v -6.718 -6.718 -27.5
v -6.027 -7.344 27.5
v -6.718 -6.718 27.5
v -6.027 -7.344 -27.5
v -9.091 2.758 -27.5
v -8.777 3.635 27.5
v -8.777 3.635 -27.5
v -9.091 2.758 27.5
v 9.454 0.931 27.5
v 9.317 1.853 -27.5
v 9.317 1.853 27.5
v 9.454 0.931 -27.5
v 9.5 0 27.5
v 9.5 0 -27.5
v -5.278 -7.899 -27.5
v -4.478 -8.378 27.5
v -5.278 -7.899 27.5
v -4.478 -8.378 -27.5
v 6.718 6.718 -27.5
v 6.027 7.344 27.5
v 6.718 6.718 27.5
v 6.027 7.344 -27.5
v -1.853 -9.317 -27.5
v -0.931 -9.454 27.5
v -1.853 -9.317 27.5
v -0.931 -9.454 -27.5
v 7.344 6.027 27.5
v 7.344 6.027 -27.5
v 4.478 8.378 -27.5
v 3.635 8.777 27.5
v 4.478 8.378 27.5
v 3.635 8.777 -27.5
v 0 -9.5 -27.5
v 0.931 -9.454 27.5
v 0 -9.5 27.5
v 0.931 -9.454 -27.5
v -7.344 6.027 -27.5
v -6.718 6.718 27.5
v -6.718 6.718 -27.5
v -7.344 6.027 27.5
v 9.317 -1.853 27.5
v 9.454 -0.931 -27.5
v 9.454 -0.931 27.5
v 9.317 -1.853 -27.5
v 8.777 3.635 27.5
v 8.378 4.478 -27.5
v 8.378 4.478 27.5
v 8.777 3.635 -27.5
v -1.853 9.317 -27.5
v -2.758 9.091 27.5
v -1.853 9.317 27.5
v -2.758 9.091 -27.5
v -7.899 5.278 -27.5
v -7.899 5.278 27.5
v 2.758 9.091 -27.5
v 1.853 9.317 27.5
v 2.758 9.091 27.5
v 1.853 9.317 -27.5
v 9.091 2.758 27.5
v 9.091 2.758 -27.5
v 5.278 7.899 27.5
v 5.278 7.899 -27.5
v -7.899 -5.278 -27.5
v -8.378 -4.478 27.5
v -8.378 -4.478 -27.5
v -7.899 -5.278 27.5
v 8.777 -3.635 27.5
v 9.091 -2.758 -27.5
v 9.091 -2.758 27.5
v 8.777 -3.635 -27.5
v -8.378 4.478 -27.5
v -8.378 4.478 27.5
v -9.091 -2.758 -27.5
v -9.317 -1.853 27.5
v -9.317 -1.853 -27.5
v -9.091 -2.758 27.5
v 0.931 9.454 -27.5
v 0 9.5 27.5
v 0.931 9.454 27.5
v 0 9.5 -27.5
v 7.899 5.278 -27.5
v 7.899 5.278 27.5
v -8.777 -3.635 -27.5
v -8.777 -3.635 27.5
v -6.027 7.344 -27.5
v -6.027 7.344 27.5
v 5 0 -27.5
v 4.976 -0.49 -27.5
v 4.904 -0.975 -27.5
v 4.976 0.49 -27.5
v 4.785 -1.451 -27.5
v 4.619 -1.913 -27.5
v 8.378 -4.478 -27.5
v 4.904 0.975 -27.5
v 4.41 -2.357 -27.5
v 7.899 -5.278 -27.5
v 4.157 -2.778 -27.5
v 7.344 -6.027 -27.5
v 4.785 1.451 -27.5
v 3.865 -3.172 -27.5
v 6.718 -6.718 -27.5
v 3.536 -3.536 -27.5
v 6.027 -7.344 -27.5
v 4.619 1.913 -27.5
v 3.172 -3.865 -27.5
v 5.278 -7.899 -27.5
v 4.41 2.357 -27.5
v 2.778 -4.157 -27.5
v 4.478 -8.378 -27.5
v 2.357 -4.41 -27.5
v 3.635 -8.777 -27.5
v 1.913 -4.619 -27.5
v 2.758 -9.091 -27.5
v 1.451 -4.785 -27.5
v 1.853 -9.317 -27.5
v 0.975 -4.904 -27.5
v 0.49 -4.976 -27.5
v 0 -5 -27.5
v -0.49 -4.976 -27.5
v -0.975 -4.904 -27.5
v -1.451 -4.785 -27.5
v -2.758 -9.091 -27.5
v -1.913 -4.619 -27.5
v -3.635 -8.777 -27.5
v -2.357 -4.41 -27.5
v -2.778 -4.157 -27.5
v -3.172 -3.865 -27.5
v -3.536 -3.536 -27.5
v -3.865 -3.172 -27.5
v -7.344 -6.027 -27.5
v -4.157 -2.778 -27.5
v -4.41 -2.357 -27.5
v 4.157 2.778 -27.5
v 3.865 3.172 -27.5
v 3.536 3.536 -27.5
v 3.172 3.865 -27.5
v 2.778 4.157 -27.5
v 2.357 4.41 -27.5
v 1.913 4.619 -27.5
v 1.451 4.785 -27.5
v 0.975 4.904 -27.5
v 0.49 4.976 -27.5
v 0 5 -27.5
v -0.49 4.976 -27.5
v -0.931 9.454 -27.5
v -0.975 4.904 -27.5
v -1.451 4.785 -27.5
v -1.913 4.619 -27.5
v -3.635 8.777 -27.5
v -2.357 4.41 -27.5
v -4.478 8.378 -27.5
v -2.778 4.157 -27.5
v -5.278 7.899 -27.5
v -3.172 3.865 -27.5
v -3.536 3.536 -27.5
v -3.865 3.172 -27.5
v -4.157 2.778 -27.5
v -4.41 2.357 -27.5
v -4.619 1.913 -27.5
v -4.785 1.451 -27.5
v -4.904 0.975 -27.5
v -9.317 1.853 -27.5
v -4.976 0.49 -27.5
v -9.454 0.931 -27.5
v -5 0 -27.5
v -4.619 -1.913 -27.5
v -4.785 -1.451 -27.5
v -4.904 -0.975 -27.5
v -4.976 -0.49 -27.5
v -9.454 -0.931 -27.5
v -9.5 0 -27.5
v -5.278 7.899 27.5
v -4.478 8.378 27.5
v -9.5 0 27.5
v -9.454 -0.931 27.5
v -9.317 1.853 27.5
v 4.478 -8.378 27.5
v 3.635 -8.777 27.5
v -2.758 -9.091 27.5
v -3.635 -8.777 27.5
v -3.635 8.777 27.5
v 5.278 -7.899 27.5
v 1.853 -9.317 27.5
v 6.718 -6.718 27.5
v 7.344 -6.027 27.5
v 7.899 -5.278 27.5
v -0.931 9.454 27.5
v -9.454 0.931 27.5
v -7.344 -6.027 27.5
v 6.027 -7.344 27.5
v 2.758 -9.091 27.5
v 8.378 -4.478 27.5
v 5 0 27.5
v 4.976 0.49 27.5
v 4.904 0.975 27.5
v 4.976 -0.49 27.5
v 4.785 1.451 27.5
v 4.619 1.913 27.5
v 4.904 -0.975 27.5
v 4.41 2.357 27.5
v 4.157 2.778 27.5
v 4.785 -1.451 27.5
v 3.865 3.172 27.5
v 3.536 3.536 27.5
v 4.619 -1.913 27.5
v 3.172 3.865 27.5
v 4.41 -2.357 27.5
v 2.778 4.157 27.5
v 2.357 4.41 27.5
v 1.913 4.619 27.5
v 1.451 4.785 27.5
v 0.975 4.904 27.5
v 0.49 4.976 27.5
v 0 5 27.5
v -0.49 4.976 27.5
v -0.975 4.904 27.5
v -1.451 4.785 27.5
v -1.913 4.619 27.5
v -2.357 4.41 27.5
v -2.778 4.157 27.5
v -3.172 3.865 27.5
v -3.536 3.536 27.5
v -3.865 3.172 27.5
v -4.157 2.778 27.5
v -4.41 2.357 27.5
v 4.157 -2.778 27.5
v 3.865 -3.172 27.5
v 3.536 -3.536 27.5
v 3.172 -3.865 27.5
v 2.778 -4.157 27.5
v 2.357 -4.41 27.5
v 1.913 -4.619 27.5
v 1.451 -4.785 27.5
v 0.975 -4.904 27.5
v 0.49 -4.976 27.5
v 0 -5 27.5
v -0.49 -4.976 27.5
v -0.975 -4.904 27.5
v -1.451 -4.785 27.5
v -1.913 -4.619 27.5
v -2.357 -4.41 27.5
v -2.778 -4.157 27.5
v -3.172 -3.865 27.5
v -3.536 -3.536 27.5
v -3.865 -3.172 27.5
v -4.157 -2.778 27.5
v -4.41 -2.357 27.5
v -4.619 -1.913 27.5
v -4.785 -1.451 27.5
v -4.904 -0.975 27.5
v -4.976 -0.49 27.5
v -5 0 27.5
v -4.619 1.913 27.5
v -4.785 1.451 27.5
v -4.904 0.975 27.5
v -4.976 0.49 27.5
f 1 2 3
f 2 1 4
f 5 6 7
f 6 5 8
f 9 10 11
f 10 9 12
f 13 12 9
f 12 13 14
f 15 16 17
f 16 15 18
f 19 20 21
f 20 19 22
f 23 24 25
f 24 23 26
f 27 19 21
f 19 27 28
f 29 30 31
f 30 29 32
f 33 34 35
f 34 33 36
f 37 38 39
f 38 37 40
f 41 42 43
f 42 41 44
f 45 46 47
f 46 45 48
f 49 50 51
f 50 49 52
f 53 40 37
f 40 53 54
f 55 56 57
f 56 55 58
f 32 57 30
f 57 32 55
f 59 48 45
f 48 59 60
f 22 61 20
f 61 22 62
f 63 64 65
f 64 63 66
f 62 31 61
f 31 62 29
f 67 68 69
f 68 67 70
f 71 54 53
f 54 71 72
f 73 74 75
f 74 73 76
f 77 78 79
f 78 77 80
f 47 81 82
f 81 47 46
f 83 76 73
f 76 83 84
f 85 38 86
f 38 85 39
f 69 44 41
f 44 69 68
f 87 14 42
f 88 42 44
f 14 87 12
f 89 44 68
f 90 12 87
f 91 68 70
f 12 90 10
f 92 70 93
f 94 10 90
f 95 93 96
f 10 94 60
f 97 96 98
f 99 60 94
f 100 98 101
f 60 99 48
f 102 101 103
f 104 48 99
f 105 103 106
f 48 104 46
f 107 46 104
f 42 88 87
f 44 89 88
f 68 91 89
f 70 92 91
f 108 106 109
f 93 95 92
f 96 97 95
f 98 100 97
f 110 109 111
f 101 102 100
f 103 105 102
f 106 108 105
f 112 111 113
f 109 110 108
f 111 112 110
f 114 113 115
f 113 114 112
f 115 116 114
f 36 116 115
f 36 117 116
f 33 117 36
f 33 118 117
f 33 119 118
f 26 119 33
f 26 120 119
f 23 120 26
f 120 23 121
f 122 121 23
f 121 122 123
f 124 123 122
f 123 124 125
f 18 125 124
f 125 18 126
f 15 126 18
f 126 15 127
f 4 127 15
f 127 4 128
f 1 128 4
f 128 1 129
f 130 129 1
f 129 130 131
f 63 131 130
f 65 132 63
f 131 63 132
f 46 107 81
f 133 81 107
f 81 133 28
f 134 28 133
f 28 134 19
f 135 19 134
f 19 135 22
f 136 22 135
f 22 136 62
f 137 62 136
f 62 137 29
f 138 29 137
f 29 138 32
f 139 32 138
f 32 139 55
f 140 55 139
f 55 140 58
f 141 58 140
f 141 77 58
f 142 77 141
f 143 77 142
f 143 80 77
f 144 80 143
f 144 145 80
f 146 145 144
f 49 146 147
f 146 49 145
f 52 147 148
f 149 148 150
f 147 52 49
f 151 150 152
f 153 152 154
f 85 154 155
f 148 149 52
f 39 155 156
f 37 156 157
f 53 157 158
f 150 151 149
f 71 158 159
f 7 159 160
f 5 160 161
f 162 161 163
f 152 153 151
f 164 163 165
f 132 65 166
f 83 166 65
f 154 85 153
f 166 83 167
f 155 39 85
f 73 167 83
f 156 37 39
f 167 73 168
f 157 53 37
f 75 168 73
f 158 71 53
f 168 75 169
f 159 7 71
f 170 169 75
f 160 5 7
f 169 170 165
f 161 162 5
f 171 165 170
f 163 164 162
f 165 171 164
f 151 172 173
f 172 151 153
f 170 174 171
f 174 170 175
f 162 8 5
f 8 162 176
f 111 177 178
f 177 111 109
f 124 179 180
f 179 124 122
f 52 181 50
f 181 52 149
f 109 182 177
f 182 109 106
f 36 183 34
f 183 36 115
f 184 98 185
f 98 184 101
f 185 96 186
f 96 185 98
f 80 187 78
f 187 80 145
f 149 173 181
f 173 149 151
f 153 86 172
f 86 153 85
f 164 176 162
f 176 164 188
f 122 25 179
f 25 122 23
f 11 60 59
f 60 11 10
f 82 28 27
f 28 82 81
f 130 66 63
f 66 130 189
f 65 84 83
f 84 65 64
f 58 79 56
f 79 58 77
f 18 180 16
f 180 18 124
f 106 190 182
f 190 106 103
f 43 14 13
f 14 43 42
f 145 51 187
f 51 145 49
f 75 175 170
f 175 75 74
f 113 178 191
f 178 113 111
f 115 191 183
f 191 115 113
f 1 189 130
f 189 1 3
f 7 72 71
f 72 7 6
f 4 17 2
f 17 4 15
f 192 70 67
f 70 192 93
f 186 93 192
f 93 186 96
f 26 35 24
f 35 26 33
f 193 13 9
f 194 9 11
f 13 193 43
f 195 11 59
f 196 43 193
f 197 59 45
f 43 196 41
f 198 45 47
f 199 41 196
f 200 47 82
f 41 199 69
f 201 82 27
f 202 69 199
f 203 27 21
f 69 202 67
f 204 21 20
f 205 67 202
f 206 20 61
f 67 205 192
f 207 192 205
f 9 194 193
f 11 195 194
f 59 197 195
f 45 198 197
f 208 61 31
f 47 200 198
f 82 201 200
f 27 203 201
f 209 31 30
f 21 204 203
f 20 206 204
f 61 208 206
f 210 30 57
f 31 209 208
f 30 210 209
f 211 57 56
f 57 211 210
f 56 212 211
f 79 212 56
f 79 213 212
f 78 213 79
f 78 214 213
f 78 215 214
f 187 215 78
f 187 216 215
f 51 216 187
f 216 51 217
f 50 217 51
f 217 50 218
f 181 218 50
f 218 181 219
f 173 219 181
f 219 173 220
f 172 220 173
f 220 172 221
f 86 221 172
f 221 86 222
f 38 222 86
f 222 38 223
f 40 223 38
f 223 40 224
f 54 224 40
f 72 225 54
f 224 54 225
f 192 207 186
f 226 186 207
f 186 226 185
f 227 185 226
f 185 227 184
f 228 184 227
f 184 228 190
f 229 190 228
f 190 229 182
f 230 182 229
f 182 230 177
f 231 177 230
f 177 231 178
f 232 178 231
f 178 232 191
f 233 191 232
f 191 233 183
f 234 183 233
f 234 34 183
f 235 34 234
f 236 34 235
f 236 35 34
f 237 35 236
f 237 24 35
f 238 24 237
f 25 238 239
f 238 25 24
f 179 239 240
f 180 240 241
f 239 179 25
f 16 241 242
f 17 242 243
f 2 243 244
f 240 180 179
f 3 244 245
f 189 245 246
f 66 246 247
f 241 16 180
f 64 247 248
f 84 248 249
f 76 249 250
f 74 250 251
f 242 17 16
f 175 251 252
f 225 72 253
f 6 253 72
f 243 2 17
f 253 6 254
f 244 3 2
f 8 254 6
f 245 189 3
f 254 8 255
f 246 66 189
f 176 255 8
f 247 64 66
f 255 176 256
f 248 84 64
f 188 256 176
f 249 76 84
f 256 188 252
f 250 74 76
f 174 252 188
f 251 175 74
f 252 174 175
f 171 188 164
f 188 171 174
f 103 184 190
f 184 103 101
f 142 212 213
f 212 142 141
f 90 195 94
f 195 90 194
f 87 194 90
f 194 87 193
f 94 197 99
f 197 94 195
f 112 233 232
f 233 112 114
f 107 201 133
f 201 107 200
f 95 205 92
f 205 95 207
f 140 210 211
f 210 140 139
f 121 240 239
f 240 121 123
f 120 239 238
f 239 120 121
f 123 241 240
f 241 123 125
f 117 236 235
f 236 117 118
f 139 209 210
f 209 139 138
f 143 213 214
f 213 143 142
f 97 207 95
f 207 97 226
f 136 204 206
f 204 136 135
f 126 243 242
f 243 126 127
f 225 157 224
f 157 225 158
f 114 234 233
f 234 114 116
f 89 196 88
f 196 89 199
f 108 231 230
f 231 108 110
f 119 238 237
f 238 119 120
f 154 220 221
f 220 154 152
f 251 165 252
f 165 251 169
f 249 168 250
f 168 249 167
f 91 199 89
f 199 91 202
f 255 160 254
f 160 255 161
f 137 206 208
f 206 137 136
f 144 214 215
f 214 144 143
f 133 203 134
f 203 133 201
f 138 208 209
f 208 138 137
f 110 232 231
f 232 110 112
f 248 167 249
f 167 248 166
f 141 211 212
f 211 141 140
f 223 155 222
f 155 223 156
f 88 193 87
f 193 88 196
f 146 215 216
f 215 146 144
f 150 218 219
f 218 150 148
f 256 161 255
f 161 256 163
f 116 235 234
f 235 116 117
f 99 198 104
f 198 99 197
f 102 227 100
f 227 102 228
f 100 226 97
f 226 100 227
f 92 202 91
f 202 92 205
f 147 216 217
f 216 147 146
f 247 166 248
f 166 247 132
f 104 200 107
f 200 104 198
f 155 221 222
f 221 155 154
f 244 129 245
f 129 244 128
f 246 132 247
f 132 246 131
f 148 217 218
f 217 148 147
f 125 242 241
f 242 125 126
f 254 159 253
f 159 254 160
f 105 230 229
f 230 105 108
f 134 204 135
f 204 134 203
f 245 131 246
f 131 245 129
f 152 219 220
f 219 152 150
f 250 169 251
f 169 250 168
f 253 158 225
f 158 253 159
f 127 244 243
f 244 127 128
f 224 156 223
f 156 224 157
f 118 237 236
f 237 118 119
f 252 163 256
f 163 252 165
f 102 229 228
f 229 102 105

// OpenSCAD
$fn = 64;

module ball_bearing() {
    difference() {
        // Outer cylinder representing the outer diameter of the bearing
        cylinder(d = 19, h = 55, center = true);
        // Inner cylinder representing the bore
        translate([0, 0, -27.5])
            cylinder(d = 10, h = 55, center = false);
    }
}

ball_bearing();
